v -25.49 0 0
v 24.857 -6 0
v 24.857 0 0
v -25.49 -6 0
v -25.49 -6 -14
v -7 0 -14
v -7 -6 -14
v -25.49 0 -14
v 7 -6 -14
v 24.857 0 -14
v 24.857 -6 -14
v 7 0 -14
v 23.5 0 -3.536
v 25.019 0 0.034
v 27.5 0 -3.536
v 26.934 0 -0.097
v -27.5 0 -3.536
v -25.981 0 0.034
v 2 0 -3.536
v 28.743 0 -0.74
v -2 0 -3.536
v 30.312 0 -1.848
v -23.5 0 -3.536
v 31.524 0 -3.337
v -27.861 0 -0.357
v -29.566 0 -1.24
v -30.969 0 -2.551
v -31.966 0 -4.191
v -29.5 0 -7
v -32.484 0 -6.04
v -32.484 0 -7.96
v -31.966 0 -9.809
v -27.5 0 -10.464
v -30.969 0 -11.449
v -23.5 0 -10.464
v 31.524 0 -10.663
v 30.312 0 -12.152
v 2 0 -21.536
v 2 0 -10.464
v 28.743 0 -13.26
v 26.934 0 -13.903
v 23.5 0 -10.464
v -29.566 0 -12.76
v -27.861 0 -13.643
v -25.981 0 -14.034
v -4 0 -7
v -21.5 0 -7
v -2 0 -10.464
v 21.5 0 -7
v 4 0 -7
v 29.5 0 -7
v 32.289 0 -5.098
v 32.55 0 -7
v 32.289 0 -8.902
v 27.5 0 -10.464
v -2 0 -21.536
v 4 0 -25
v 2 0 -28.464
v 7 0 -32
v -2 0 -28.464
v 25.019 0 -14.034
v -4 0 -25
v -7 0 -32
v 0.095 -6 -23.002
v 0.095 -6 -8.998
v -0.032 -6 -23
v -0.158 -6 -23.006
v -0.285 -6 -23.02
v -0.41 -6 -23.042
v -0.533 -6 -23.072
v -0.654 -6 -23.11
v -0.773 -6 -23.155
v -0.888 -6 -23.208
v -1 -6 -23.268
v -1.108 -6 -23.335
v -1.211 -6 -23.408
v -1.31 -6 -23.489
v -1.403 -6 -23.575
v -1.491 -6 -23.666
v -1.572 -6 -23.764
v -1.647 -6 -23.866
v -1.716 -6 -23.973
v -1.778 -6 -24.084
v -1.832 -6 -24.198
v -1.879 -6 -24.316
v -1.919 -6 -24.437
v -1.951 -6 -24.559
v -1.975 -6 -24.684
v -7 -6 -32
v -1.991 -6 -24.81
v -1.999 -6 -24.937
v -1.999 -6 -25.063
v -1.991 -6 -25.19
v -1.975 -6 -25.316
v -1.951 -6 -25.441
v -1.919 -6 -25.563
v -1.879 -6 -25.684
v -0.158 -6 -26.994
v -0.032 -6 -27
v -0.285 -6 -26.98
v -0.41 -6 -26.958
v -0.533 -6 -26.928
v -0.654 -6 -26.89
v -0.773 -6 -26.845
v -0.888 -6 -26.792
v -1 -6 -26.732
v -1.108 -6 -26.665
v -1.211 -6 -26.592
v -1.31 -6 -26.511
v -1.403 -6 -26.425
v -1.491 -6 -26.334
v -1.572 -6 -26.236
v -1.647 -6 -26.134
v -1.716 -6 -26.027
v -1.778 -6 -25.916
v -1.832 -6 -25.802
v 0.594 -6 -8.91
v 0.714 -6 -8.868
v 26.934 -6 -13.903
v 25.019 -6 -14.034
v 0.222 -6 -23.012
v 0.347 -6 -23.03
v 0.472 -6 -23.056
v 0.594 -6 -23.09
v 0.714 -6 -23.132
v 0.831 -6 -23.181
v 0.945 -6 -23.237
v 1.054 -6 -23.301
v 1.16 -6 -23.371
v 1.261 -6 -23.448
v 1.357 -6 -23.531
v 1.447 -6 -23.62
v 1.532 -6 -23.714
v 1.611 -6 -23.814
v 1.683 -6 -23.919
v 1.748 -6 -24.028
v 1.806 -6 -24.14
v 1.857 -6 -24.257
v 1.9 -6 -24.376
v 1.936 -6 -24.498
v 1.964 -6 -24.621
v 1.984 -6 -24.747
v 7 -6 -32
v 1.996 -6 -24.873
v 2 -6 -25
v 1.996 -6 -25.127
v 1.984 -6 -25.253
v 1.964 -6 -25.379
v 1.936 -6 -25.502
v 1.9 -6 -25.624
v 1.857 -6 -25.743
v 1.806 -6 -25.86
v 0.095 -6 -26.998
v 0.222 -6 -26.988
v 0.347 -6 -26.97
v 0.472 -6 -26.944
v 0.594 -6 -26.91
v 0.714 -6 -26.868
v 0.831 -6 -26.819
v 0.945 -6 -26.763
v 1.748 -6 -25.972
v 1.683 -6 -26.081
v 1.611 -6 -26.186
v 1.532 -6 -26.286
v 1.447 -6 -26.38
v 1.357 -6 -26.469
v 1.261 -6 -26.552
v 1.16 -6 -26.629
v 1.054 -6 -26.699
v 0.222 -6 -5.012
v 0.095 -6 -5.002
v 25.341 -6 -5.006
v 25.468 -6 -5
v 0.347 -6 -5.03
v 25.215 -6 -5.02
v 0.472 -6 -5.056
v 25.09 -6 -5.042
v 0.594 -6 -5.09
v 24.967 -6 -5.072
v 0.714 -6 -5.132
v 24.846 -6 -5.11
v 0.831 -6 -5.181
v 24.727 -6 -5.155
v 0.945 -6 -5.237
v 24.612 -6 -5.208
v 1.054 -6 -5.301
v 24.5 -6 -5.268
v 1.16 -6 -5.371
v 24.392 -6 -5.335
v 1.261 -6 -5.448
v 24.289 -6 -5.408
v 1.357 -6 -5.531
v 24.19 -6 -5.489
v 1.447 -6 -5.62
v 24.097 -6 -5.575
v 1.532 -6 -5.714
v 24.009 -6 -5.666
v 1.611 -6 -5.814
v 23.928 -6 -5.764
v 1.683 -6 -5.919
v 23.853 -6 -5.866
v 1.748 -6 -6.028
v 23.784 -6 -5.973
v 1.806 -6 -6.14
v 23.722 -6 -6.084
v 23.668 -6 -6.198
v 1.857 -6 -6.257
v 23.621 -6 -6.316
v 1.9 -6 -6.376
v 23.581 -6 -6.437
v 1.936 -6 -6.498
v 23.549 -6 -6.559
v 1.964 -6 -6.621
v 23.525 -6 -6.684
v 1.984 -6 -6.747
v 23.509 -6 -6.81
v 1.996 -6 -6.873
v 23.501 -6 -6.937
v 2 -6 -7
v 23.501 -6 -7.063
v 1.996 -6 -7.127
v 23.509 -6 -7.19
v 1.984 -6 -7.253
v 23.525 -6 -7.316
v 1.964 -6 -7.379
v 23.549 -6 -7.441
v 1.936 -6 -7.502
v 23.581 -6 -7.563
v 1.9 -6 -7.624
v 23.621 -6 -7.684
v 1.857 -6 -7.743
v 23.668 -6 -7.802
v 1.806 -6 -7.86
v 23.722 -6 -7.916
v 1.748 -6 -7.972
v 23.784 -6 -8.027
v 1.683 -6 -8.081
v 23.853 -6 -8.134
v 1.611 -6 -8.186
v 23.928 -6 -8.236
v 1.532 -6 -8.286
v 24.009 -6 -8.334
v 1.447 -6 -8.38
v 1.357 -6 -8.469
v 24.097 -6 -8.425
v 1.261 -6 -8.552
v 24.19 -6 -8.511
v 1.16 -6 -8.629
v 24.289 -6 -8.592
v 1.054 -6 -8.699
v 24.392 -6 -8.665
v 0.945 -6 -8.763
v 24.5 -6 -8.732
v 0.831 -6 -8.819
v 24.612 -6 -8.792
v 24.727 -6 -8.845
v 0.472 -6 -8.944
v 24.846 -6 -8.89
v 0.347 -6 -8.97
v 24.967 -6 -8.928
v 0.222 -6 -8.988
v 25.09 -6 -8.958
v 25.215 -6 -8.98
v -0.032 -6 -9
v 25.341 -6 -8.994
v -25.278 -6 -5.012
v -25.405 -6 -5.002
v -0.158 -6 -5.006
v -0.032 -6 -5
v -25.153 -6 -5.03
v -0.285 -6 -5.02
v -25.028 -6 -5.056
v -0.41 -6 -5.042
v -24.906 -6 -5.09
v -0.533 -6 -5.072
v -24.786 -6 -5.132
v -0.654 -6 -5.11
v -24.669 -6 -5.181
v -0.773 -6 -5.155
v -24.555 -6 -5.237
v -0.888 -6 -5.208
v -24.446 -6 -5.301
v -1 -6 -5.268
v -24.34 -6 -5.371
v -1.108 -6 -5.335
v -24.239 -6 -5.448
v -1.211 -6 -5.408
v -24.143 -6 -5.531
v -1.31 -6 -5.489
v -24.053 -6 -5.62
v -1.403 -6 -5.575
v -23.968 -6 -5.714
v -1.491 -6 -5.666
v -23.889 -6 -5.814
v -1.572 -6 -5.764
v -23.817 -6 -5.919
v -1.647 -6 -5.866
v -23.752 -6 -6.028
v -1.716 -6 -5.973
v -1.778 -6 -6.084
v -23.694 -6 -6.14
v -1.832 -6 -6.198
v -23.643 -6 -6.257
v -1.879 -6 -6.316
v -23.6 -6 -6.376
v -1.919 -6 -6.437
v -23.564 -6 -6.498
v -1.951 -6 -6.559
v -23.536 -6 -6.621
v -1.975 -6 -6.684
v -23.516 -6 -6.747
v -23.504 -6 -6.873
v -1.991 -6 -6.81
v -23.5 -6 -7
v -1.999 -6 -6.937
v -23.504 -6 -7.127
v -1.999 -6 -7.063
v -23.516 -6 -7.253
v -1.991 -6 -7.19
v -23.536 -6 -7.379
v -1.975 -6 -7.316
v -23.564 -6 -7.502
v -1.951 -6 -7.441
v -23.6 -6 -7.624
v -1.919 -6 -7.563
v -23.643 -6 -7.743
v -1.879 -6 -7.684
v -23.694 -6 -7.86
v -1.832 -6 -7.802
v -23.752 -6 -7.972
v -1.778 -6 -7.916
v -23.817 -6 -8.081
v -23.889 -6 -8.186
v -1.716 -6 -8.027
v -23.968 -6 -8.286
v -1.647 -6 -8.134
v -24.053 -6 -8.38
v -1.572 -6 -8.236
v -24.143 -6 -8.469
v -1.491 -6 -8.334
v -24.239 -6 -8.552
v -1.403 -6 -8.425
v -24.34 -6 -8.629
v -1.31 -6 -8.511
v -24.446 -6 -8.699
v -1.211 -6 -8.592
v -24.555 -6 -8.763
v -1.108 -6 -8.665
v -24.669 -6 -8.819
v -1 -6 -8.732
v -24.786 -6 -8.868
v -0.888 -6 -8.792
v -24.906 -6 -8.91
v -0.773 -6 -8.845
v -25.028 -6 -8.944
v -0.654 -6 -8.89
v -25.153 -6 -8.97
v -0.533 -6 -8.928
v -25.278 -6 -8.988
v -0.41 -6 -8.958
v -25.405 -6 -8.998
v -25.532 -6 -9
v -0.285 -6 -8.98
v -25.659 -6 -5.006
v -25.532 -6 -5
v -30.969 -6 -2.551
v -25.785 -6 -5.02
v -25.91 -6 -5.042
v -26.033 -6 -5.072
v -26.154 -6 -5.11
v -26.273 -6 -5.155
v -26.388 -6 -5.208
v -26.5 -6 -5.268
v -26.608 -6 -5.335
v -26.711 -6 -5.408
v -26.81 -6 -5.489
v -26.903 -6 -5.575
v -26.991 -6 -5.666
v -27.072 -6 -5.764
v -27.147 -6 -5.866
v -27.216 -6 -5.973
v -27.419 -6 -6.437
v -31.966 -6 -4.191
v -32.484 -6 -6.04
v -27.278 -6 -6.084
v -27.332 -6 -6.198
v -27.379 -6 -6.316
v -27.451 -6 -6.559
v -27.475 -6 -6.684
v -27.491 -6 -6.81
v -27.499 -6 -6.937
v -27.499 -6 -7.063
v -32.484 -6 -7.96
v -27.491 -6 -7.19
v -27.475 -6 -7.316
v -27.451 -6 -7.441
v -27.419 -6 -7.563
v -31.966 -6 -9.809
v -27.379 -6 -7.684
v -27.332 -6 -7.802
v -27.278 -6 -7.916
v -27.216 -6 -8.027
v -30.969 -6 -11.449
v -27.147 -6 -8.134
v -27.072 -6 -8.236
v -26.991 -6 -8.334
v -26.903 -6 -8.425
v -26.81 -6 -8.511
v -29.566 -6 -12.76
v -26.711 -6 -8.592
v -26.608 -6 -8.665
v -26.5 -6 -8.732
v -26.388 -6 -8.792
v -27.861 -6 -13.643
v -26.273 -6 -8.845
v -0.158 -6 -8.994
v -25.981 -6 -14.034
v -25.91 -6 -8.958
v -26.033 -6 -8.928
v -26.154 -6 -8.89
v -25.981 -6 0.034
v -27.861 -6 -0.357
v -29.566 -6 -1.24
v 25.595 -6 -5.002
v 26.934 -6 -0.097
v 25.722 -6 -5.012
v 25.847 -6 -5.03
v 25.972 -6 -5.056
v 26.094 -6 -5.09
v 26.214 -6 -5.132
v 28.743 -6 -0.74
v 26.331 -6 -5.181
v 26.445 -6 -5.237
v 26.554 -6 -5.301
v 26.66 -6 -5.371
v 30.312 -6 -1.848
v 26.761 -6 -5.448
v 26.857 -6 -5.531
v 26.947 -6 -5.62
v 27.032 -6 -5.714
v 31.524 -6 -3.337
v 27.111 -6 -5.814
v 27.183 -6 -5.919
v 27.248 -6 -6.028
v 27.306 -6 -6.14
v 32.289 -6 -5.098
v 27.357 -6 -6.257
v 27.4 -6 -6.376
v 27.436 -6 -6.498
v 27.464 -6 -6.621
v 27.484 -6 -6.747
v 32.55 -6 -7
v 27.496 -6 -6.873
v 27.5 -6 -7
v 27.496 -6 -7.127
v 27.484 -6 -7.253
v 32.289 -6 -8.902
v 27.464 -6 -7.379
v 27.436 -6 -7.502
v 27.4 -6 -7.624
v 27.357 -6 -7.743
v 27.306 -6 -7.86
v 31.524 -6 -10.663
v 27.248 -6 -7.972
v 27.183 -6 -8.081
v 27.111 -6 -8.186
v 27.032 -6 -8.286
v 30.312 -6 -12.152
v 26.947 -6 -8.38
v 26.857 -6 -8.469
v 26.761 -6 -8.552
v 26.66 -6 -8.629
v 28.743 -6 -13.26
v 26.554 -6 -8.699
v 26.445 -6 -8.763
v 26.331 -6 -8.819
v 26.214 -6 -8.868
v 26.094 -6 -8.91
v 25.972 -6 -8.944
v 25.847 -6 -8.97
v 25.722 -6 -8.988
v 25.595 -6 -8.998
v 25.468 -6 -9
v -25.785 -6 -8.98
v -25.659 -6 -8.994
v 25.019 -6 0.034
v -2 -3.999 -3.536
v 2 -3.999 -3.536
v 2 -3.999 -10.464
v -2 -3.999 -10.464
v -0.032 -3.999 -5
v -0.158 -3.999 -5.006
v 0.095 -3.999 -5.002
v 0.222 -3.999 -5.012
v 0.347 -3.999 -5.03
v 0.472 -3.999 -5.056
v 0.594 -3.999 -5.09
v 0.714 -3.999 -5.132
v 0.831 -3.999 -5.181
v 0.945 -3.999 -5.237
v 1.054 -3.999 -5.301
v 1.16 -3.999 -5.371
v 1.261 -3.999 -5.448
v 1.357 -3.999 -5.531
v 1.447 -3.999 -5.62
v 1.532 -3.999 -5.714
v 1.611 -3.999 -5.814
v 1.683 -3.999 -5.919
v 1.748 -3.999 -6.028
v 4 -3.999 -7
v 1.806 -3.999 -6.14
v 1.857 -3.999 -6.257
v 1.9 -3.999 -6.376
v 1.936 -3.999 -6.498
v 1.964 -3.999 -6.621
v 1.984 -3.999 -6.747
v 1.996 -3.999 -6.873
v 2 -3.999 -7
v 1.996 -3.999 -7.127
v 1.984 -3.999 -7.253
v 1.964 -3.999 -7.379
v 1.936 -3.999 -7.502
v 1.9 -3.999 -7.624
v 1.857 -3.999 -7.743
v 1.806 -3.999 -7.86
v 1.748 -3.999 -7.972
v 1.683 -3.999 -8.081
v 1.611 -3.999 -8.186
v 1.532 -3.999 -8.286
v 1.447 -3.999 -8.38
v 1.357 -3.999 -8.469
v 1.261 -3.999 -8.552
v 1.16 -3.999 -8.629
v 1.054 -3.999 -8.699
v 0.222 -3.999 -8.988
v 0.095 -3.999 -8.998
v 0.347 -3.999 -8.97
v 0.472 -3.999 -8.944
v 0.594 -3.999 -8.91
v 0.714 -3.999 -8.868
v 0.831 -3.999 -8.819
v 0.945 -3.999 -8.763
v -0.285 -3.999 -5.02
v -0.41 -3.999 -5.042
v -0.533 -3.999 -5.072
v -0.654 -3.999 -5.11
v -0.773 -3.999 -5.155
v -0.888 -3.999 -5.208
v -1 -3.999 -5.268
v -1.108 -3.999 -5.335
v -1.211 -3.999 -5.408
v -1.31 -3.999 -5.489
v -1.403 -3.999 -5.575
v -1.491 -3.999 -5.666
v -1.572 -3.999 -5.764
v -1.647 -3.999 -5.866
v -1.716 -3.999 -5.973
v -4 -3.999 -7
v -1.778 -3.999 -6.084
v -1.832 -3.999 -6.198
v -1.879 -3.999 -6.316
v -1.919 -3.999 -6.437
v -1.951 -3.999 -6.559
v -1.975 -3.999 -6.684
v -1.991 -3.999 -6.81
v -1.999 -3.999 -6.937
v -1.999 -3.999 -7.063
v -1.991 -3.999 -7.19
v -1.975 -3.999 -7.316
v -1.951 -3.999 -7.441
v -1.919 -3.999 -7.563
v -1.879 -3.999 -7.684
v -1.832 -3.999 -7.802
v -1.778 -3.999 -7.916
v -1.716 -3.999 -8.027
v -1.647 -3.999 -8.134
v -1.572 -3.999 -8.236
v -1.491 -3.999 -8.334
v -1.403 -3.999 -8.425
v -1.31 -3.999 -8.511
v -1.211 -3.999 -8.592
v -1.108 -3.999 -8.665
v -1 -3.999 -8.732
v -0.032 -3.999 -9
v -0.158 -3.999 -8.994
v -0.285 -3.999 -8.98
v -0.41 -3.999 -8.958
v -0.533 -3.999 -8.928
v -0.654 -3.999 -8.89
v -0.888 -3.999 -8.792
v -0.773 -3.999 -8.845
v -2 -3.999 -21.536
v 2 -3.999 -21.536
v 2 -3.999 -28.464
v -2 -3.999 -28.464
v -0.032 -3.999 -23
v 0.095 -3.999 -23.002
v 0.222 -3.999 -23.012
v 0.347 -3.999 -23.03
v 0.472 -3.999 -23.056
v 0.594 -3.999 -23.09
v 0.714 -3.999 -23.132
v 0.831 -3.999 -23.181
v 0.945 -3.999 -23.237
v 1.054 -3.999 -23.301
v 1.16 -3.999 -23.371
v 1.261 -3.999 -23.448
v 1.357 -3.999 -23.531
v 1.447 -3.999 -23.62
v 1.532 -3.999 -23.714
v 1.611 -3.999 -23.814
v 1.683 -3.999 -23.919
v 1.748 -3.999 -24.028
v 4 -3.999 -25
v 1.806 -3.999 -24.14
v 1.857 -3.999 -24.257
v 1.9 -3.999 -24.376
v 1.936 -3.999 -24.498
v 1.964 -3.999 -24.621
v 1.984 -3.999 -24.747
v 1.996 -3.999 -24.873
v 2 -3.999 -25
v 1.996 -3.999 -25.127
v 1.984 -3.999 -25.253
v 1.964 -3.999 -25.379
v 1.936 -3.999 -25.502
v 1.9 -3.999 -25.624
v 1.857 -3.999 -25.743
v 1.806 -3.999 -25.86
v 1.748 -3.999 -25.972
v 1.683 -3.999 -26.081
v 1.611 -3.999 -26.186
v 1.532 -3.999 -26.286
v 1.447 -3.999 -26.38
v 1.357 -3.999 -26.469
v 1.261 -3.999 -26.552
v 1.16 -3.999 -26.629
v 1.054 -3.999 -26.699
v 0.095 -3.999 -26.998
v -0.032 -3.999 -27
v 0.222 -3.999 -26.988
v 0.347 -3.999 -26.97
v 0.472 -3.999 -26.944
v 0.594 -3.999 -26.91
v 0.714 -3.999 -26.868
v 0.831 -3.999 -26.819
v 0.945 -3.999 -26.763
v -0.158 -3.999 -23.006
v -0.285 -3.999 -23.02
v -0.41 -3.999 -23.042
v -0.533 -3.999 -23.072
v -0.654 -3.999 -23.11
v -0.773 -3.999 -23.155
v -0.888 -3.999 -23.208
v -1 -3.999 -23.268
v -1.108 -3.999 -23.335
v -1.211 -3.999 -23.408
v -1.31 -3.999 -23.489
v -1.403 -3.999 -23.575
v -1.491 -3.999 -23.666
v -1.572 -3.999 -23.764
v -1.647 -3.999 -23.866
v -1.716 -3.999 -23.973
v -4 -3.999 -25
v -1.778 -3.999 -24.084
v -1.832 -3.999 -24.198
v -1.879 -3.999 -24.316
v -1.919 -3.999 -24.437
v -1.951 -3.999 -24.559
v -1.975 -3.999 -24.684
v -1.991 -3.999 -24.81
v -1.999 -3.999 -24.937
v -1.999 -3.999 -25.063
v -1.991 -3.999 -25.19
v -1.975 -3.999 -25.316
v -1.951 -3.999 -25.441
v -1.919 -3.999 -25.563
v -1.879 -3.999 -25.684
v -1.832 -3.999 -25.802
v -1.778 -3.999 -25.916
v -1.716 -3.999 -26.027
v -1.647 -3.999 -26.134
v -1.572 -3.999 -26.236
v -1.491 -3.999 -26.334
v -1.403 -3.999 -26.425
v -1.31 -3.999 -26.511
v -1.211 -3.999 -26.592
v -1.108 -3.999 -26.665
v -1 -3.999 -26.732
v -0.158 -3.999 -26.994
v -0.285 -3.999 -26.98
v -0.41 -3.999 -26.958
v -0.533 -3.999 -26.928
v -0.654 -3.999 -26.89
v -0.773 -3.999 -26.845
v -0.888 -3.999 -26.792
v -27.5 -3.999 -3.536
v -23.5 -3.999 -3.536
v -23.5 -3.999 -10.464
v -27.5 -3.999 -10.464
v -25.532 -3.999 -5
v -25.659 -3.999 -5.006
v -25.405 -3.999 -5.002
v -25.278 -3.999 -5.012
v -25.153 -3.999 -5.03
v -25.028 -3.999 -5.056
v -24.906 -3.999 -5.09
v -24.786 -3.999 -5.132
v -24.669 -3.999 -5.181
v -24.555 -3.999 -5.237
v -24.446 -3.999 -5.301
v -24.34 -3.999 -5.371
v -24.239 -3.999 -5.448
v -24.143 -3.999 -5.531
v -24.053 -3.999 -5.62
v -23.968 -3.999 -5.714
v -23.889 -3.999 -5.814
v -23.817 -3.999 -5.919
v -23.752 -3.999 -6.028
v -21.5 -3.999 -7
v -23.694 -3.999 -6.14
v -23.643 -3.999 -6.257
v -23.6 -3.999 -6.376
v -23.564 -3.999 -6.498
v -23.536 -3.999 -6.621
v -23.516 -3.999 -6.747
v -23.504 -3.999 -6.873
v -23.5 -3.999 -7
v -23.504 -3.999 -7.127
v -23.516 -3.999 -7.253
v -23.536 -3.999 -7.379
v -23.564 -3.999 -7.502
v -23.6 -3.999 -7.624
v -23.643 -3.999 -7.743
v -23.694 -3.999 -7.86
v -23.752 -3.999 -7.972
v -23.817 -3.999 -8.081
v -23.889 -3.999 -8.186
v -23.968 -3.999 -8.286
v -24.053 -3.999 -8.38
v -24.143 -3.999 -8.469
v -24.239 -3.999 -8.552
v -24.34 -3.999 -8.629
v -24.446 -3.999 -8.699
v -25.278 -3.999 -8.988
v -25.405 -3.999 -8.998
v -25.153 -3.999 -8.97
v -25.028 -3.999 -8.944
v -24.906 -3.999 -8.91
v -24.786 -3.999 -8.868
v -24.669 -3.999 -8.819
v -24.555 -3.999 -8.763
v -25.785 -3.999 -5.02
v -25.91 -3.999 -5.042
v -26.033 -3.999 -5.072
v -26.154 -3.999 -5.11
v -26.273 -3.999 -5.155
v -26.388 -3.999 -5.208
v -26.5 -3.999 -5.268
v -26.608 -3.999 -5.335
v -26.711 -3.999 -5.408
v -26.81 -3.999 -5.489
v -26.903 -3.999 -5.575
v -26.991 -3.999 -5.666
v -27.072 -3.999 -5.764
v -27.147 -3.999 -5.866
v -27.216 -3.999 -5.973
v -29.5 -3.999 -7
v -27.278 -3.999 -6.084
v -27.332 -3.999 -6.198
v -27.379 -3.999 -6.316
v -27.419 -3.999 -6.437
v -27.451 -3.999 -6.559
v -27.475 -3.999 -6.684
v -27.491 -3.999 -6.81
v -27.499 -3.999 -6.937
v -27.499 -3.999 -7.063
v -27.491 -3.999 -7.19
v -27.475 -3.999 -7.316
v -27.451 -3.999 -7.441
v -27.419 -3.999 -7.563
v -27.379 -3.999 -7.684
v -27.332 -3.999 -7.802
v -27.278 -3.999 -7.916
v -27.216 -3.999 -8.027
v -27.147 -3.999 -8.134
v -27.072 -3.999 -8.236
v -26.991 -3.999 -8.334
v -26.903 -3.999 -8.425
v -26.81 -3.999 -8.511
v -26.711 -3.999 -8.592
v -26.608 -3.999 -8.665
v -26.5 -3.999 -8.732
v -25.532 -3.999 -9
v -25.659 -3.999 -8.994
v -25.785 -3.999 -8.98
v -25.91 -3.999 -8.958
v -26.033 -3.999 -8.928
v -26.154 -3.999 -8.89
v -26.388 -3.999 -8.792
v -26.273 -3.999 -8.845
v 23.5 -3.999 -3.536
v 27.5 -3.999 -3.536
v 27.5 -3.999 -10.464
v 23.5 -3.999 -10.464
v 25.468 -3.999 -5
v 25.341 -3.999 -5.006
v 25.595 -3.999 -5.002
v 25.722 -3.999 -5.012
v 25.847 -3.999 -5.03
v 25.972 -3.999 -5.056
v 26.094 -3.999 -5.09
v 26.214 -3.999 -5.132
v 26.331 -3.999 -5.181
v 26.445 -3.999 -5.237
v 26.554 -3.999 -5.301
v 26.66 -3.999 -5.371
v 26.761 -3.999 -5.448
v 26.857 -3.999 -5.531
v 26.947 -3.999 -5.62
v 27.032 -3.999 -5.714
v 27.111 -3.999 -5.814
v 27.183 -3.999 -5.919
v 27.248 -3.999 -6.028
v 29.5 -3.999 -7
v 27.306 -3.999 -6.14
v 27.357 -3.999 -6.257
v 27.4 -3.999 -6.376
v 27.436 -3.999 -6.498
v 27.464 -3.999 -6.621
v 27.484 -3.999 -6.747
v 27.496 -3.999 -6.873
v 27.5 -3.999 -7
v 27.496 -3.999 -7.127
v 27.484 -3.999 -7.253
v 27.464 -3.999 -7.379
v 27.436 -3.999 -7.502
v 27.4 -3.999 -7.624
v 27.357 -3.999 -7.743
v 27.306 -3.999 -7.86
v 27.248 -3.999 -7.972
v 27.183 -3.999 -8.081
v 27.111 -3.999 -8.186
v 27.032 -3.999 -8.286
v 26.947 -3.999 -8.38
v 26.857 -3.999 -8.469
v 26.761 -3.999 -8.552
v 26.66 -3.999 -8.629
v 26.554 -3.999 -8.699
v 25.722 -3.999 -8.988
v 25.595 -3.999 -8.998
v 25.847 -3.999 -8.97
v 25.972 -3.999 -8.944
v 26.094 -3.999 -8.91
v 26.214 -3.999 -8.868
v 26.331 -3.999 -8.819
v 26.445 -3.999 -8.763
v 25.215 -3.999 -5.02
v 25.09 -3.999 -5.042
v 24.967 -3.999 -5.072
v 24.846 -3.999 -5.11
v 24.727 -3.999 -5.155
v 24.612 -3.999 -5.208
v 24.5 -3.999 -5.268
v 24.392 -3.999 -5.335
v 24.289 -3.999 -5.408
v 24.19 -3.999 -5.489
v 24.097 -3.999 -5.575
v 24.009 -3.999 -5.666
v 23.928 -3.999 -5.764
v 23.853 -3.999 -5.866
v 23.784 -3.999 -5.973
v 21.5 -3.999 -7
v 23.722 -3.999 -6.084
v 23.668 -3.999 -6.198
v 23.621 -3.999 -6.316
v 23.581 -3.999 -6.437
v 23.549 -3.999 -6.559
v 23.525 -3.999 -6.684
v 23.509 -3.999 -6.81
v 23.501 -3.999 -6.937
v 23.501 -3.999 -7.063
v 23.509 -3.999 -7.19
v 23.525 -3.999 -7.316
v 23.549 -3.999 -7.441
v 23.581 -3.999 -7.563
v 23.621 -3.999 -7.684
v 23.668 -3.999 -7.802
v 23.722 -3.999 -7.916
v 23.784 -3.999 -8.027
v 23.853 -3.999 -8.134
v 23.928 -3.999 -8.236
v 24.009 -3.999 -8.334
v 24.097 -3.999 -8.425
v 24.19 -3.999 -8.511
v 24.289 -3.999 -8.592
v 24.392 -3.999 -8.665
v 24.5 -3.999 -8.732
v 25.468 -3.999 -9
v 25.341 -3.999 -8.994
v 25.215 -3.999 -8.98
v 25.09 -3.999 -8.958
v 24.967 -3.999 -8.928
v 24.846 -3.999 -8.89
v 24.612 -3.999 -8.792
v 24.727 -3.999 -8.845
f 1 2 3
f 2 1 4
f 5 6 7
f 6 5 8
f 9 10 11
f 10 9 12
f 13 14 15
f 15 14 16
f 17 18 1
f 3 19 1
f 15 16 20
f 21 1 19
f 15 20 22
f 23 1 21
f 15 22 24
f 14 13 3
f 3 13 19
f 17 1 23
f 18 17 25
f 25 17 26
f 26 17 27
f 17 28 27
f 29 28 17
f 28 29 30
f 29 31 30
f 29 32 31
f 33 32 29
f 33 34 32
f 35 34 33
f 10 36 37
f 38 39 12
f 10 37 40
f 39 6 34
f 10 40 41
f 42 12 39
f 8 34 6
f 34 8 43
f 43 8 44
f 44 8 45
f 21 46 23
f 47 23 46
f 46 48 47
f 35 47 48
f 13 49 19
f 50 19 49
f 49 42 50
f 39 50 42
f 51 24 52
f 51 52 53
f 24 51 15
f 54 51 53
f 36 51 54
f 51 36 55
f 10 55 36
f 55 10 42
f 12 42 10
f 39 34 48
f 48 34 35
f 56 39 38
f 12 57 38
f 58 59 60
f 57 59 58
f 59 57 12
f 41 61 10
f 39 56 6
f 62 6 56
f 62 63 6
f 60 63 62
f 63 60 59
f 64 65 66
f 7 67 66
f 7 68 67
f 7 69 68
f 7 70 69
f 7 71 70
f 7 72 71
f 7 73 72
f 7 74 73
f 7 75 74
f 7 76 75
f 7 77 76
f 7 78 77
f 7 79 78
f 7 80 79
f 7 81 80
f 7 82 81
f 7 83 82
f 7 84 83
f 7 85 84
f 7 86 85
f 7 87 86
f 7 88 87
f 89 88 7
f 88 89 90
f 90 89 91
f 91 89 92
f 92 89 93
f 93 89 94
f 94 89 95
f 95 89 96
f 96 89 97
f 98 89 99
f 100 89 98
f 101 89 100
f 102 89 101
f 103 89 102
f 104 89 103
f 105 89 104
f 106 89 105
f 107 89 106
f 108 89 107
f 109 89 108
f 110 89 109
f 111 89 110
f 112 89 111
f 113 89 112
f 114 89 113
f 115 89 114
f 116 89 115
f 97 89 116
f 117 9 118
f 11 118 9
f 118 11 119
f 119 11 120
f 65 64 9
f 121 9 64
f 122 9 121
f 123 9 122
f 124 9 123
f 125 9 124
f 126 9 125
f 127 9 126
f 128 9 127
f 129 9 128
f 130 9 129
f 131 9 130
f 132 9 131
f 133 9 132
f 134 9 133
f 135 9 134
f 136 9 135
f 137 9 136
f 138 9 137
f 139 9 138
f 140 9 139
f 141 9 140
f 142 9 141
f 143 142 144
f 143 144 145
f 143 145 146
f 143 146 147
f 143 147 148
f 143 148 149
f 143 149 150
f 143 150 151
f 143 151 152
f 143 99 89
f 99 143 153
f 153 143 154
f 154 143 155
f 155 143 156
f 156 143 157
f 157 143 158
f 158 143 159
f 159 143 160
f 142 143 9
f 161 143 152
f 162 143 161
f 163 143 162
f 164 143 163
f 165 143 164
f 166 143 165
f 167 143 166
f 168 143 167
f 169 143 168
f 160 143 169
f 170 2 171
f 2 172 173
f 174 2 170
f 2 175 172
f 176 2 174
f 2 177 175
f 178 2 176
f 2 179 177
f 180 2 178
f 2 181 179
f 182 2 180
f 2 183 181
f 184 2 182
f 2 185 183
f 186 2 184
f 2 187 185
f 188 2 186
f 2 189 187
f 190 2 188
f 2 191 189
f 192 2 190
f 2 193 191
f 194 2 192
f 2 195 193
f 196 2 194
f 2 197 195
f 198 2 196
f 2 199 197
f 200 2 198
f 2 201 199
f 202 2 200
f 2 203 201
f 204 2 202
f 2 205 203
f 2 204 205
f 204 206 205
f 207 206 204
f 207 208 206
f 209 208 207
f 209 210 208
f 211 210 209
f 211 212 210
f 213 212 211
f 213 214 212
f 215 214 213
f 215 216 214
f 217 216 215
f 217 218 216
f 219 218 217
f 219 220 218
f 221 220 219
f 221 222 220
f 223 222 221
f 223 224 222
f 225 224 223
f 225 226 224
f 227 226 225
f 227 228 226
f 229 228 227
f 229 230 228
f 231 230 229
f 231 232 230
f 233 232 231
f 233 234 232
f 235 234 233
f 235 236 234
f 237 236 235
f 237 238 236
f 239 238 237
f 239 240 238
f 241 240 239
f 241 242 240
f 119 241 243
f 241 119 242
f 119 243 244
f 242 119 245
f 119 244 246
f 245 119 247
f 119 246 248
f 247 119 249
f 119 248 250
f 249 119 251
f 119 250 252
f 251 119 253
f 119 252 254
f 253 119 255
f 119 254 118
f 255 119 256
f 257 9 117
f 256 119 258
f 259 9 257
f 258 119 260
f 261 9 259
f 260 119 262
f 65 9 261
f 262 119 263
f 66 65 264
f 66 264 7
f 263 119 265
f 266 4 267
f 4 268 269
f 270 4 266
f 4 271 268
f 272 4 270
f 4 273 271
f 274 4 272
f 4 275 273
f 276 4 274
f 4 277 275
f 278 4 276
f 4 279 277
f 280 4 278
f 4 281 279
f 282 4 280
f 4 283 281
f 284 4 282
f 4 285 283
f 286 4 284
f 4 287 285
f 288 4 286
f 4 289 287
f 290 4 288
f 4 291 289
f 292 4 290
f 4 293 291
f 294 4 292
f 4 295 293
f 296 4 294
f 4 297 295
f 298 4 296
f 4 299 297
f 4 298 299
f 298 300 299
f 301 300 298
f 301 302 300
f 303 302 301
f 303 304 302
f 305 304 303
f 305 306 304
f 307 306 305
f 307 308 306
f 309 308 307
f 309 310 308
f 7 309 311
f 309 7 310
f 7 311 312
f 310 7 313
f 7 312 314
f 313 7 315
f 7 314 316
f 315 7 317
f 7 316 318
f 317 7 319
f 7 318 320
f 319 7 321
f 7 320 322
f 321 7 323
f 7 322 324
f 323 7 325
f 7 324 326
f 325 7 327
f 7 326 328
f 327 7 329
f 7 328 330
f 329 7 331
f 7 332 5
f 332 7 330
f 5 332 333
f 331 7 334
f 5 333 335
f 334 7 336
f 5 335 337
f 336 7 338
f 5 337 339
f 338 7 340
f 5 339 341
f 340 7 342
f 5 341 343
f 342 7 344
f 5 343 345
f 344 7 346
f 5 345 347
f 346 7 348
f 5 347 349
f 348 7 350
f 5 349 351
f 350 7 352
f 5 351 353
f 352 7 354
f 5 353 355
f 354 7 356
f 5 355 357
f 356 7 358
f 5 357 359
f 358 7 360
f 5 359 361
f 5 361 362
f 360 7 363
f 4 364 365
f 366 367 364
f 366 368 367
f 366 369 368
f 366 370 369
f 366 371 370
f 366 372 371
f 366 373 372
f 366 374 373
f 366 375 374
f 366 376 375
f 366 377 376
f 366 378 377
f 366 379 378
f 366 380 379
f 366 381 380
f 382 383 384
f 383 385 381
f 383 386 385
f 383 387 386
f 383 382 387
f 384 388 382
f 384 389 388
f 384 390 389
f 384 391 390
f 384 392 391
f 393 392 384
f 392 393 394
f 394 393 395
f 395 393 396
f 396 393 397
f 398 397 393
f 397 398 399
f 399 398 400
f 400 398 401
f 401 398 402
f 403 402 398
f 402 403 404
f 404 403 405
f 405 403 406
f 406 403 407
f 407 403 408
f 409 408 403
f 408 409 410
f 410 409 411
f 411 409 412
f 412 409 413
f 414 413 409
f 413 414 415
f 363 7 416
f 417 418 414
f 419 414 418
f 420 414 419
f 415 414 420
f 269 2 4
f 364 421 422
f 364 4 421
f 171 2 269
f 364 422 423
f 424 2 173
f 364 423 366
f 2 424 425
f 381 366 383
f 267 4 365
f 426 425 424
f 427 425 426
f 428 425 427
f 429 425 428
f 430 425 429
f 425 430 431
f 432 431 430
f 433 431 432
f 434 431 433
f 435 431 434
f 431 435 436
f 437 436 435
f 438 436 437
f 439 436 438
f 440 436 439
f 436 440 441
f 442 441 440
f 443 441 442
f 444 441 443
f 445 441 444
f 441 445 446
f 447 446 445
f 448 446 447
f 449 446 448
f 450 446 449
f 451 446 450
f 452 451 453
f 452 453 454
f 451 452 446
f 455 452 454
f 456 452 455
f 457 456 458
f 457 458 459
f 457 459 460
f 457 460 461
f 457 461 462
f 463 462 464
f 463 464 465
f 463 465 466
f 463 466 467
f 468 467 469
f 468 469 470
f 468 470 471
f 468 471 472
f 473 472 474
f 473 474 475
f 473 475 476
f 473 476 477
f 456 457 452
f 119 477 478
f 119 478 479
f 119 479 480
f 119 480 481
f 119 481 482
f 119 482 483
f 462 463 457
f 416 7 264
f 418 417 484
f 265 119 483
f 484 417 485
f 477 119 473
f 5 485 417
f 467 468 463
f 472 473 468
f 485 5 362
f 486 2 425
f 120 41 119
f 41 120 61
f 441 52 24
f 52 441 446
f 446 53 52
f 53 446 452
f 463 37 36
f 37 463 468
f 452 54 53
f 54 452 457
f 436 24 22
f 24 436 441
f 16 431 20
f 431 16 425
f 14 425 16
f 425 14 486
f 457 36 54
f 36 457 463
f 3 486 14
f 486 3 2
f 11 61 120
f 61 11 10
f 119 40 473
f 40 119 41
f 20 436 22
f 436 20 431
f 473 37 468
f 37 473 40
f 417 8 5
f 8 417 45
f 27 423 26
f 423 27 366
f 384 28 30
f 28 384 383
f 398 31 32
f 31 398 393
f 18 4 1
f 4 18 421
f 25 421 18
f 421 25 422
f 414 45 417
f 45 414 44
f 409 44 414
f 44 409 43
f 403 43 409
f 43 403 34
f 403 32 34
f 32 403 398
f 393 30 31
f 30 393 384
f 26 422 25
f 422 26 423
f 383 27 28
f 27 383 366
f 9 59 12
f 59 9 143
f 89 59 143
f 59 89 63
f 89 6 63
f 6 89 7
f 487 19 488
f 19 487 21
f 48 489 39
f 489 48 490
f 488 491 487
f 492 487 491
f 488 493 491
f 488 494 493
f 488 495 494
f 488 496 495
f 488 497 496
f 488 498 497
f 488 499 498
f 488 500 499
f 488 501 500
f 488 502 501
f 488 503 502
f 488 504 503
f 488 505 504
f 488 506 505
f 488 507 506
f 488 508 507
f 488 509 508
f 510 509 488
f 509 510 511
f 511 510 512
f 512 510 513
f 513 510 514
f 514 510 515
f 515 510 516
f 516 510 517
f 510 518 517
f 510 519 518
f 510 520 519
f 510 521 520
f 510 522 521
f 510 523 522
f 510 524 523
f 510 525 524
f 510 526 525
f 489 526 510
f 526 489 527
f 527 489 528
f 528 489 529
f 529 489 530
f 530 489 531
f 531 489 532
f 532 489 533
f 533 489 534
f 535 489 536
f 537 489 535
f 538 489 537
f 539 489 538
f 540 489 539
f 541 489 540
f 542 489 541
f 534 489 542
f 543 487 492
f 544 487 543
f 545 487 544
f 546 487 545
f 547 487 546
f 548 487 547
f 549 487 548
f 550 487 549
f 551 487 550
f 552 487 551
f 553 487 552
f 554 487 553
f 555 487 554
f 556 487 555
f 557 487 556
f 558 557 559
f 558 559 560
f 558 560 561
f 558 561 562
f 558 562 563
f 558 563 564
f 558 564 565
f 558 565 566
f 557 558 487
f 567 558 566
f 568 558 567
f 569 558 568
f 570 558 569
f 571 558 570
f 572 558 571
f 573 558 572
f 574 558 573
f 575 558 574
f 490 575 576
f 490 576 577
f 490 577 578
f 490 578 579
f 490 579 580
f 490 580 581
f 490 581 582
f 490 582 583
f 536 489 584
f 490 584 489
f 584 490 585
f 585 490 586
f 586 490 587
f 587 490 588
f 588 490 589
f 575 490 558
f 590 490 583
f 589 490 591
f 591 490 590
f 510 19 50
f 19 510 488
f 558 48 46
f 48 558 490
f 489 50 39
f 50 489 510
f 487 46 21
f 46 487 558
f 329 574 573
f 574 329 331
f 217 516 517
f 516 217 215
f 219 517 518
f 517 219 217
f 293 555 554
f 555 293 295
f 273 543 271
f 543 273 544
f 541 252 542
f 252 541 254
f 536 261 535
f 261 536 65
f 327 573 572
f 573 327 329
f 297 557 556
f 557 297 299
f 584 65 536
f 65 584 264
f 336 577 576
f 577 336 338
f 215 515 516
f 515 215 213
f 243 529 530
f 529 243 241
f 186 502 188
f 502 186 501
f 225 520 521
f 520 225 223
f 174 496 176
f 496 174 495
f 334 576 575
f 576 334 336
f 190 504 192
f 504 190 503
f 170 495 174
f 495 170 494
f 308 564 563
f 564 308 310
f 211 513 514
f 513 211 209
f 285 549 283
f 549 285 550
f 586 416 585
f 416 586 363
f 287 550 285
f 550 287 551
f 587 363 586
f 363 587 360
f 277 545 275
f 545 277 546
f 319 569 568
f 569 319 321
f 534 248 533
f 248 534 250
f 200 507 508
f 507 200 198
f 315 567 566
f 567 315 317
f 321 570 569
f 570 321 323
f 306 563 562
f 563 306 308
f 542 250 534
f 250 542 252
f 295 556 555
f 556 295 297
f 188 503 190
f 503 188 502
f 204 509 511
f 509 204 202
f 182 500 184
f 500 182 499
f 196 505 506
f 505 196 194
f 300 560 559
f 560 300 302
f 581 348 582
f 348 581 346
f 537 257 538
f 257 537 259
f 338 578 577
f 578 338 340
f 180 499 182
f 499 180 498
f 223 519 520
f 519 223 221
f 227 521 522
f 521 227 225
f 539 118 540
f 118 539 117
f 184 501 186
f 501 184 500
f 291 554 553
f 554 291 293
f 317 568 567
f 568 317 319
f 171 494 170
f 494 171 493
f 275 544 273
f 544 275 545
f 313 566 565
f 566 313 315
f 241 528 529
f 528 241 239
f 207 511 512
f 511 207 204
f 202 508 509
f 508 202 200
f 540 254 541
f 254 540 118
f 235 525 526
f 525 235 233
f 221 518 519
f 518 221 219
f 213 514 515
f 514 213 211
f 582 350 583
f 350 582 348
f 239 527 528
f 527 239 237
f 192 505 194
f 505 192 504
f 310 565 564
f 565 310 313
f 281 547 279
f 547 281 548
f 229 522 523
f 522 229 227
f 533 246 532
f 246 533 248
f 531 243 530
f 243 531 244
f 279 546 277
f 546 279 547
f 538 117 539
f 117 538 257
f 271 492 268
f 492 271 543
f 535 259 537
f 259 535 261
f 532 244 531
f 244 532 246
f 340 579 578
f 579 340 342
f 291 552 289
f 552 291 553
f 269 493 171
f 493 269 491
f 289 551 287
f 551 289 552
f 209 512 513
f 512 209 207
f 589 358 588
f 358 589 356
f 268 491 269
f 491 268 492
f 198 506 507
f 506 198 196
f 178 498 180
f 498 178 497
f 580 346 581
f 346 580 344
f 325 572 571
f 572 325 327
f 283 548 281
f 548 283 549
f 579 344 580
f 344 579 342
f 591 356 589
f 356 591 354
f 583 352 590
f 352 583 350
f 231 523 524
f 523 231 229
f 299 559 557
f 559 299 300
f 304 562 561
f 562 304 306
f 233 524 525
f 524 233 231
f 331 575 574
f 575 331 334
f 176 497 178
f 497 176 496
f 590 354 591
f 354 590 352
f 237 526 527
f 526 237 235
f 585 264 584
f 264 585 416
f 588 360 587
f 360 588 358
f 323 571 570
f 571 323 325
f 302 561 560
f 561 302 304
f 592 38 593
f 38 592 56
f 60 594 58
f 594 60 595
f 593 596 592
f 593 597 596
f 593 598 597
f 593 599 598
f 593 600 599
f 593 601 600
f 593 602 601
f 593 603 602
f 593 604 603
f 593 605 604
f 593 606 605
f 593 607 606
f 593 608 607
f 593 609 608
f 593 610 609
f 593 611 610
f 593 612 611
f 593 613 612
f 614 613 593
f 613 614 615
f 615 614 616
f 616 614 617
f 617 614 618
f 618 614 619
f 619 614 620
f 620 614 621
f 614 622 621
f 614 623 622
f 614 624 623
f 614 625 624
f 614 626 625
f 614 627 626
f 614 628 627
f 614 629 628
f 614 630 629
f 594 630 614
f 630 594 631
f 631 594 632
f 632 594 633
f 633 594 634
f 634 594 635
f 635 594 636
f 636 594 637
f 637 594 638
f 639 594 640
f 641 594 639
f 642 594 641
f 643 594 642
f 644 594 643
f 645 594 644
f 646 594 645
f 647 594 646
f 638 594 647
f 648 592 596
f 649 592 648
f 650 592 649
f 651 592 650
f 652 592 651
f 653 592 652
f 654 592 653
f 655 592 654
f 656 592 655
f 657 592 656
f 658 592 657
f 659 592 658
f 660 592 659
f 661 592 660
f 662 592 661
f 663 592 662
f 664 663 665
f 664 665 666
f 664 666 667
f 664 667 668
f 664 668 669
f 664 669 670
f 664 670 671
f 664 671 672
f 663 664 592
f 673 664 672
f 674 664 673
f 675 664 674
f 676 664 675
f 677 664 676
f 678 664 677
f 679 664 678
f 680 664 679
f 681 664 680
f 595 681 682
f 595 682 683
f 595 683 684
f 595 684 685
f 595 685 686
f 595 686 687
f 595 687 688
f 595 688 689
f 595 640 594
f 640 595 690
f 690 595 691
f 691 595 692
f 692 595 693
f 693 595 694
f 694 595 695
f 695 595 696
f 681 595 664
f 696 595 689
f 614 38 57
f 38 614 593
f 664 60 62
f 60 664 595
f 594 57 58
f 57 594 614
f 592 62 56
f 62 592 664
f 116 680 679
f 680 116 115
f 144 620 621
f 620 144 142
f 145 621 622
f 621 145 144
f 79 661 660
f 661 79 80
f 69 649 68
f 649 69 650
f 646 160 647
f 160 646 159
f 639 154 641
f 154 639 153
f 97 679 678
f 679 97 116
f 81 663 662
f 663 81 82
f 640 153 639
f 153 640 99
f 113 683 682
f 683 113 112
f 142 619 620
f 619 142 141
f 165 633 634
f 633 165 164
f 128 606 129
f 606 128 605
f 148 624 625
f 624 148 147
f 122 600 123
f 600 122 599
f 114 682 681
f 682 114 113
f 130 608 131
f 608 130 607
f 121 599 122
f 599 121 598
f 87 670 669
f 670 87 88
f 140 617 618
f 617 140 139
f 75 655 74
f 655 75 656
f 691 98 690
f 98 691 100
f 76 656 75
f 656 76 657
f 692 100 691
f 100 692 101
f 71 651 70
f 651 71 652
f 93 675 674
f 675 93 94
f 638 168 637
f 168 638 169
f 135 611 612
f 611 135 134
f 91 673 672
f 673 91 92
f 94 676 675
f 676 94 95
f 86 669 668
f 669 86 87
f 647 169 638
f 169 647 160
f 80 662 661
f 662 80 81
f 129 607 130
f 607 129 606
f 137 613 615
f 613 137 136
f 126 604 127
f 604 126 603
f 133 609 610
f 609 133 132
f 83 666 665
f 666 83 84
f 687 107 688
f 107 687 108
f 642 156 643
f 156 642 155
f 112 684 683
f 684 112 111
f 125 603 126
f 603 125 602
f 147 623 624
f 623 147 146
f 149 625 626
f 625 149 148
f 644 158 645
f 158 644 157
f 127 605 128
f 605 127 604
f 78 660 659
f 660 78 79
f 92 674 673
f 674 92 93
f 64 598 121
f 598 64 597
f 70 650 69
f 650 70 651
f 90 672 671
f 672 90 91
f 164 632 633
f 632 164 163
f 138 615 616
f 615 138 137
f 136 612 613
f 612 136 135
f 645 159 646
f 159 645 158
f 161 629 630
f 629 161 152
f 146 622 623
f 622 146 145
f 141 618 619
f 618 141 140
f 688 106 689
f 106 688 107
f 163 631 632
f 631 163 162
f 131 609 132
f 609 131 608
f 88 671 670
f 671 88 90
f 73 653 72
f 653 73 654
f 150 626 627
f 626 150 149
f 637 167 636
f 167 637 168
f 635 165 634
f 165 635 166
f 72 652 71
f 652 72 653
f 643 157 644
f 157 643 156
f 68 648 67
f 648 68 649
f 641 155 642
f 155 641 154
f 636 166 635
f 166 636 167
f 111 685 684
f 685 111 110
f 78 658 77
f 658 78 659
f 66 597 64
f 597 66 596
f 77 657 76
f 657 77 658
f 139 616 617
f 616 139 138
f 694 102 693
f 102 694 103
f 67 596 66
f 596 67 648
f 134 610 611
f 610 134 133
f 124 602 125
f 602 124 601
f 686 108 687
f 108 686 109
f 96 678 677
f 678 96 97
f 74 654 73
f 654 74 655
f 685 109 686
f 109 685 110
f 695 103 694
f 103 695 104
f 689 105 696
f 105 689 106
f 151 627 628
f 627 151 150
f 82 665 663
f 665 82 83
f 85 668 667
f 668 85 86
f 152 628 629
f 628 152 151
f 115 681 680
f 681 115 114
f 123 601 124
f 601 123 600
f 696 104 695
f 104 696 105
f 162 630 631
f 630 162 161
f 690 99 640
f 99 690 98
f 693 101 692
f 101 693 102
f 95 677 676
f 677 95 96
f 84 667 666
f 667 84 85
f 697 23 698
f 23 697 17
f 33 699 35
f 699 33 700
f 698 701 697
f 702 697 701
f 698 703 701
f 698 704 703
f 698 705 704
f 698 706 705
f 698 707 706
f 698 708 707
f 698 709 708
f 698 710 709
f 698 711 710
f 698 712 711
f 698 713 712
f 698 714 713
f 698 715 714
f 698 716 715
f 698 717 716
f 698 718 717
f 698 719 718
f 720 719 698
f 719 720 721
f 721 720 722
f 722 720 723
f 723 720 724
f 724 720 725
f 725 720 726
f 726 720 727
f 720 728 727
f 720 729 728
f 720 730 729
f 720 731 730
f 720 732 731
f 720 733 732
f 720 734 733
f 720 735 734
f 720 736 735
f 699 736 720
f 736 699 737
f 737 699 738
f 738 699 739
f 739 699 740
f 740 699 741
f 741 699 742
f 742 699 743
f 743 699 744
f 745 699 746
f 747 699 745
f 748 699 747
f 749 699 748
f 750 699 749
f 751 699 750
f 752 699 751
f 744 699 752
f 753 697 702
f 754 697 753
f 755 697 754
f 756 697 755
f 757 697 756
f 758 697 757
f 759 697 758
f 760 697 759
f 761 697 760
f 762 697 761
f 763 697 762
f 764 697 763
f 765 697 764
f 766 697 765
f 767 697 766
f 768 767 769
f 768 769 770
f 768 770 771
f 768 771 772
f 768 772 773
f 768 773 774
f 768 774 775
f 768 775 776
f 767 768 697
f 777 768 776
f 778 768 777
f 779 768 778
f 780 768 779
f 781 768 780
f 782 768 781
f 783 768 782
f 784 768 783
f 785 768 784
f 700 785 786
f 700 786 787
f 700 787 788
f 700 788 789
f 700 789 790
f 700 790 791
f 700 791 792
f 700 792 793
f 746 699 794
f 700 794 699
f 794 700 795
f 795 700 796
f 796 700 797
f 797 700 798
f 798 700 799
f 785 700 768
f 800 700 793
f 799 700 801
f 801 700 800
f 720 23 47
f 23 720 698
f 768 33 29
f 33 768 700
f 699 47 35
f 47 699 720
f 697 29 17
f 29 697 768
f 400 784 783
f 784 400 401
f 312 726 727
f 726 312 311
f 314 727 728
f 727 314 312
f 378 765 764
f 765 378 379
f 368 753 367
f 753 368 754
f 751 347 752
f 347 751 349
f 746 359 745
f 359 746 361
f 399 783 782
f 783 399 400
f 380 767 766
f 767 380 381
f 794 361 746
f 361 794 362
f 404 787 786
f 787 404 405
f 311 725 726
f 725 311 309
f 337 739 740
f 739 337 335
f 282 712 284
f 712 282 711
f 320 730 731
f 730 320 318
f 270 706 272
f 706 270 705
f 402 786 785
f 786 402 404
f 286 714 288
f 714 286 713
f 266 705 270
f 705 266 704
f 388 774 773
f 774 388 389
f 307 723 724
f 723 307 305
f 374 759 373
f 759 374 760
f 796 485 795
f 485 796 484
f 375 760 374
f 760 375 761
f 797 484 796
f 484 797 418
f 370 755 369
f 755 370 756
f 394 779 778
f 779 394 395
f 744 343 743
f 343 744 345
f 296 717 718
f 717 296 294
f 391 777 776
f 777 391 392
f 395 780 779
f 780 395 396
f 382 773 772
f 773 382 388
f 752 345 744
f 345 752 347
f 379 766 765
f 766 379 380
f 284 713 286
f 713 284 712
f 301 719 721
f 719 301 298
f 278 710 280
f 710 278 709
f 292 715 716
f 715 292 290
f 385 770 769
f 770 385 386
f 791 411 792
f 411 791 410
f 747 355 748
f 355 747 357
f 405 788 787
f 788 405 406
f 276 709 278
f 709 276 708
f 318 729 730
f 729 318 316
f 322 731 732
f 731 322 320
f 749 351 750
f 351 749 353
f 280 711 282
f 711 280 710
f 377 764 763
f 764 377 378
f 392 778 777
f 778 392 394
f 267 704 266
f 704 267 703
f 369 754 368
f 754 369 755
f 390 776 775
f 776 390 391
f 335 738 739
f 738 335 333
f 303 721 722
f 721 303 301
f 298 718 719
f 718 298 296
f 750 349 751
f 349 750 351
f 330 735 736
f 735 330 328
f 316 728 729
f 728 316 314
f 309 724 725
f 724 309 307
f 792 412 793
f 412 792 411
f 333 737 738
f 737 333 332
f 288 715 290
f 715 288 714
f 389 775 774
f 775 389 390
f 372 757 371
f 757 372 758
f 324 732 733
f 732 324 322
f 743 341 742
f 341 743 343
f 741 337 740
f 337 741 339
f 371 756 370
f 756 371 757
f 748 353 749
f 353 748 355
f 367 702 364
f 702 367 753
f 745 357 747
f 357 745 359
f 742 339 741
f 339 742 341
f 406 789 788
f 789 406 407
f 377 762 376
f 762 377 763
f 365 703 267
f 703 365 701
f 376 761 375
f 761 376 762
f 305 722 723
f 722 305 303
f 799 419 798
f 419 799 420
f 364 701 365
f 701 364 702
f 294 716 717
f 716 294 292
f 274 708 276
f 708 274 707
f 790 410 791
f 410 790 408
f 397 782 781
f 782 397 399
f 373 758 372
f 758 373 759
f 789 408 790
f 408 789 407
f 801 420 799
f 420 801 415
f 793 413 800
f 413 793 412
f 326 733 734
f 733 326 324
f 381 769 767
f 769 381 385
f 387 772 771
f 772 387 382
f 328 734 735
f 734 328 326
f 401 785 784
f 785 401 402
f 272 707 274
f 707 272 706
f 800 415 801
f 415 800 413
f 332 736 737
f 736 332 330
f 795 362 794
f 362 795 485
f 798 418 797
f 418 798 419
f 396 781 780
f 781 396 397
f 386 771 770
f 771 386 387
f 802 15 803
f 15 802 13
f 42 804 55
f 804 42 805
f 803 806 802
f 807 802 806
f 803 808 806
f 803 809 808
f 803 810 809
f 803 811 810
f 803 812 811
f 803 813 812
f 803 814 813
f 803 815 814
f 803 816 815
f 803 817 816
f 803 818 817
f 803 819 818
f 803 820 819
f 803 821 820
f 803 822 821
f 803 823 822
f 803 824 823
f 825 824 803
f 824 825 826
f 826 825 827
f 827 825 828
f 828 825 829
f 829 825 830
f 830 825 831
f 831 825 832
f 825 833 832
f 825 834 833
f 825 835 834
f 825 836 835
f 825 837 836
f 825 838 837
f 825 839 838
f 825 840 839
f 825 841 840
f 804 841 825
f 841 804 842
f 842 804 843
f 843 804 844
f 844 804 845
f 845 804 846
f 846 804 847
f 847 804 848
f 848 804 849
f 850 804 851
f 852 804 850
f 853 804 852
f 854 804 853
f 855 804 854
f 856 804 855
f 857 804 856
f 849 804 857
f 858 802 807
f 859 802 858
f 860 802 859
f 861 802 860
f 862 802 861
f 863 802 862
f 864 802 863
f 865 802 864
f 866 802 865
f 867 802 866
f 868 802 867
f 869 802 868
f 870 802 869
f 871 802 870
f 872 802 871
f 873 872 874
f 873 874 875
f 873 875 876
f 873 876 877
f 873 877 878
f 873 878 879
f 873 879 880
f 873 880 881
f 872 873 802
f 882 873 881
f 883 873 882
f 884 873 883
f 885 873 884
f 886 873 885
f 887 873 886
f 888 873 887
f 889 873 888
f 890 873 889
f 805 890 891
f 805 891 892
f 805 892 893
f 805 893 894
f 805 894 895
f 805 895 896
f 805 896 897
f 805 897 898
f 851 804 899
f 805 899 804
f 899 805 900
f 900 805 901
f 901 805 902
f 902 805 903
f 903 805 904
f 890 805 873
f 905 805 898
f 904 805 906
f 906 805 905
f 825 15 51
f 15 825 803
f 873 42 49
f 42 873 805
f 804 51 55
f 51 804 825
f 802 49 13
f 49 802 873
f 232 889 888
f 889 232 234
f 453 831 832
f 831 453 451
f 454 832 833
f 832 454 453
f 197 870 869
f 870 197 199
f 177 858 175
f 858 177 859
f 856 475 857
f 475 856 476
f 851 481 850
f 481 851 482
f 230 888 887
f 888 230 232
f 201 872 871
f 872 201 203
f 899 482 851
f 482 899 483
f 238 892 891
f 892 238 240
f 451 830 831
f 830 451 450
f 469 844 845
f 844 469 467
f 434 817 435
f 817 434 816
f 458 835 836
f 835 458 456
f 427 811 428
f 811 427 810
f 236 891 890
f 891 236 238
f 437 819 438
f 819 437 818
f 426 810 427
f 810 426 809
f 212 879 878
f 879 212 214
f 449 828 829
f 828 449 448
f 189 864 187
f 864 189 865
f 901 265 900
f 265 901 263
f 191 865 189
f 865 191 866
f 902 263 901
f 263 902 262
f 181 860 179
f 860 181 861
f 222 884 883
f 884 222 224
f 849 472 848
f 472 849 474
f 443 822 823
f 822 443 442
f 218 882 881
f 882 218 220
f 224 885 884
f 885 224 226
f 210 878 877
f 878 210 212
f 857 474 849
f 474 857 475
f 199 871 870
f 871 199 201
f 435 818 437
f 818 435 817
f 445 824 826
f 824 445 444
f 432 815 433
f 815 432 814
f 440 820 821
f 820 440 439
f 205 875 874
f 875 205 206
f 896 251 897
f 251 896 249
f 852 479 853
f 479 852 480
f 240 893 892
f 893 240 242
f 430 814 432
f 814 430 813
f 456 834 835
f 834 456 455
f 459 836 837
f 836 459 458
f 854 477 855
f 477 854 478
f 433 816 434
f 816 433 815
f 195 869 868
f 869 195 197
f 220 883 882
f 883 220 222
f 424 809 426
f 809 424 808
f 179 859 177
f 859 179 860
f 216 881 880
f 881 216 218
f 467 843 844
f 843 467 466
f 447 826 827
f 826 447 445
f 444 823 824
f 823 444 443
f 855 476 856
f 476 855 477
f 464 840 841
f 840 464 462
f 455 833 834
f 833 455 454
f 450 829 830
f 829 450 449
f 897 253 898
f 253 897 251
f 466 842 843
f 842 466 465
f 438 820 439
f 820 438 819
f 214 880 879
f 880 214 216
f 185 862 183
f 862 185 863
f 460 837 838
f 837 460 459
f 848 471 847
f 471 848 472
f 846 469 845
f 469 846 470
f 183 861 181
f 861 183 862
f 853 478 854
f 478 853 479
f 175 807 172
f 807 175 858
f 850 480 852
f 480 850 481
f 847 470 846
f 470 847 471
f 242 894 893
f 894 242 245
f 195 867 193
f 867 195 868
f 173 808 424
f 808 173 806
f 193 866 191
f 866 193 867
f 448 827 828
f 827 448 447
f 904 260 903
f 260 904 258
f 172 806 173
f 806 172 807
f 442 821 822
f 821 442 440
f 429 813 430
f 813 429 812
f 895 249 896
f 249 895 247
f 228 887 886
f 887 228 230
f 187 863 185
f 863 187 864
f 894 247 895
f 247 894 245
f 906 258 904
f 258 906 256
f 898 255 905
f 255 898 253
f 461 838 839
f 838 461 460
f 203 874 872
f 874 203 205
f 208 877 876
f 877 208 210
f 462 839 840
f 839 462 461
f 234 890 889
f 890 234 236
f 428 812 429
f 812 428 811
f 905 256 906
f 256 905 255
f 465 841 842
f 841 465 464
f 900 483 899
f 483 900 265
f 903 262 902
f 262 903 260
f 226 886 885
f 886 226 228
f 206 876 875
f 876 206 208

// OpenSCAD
// [FL_INDEX: keywords="openscad, 3d_parametric, Bicyle_Rear_Rack_holder__parametrized, csg_solid" | COT="Parametric OpenSCAD design from 3DCodeverse"]
// Title: Bicyle Rear Rack holder, parametrized

/*
T shapped connector for rear bike racks
*/



/* [Rear Rack] */
// distance from center of center screw to center of any side screw
screw_center_horizontal = 25.5;
// distance from center of top screw to center of bottom screw
screw_center_vertical = 18;
// thickness of the part. must be larger than screw head depth as we will try to make screw flush
thickness = 6;
// radius of the screw head. i.e. half of the mm wrench you want to use
hex_head_radius = 4; //[1:12]
// depth of the screw head.
hex_head_depth = 4;
// margin from the screw to the edge of the part
hex_head_margin = 3;
// radius for hole for the screw body, obviously must be smaller than hex_head_radius
screw_hole_radius = 2;
// direction of the hex head (0=flat top, 30=pointy top)
hex_head_rotation = 0; // [0,30]
// how much the hex head hole should pierce trhu the holder part being attached (not usable on this part alone)
hex_head_pierce = 100;

/* [Hidden] */
Ttop_height = 2*hex_head_radius + 2*hex_head_margin;
Tver_height = screw_center_vertical + hex_head_radius+ hex_head_margin + Ttop_height/2;

module T() {
	translate([0,-thickness/2,-Ttop_height/2])
	union(){
		difference() {
			union(){
				// top of the T
				cube(center=true,[screw_center_horizontal*2, thickness, Ttop_height]);
				translate([screw_center_horizontal,0,0]) rotate(a=90,v=[1,0,0])
					cylinder(r=Ttop_height/2+0.05, h=thickness, center=true);
				translate([-screw_center_horizontal,0,0]) rotate(a=90,v=[1,0,0])
					cylinder(r=Ttop_height/2+0.05, h=thickness, center=true);
				// NOTE: the +0.05 on the cylinders above is to remove one artifact when it joing the body. without it, it looked like the radius was smaller than the height of the cube
				// vertical part of T
				translate([0,0,Ttop_height/2-Tver_height/2])
				cube(center=true,[Ttop_height, thickness, Tver_height]);
//translate([0,1,-5]) main();
			}
			// center hole, top
			translate([0,0,0])
				hex_head();
			// center hole, bottom
			translate([0,0,-screw_center_vertical])
				hex_head();
			// right ... yeah, our axis ended up a little off :)
			translate([-screw_center_horizontal,0,0])
				hex_head();
			// left
			translate([screw_center_horizontal,0,0])
				hex_head();
		}
	}
}

/** a sane way to create hexagons. fuck understanding polyhedron syntax at this hour of the night
*/
module hex_head(){
	// logic of this http://hexnet.org/content/hexagonal-geometry
	rotate( a=hex_head_rotation, v=[0,1,0])
	union(){
		translate([0,hex_head_pierce/2+thickness/2-hex_head_depth/2+0.001,0]){
			cube( size = [hex_head_radius,hex_head_pierce+ hex_head_depth+0.001, (hex_head_radius * sqrt(3))], center=true );
			rotate( a=60, v=[0,1,0])
				cube( size = [hex_head_radius, hex_head_pierce+hex_head_depth+0.001, (hex_head_radius * sqrt(3))], center=true );
			rotate( a=120, v=[0,1,0])
				cube( size = [hex_head_radius, hex_head_pierce+hex_head_depth+0.001, (hex_head_radius * sqrt(3))], center=true );
		}

		rotate(a=90,v=[1,0,0])
			translate([0,0,0])
				cylinder(r=screw_hole_radius, h=thickness+0.001+0.001+0.001+0.001, center=true, $fn=99);
				// NOTE: some reason the +0.001 was not working there... 0.004 did the trick, leaving syntax as 0.001 as i will find it with my regexps later
	}
}

T();
